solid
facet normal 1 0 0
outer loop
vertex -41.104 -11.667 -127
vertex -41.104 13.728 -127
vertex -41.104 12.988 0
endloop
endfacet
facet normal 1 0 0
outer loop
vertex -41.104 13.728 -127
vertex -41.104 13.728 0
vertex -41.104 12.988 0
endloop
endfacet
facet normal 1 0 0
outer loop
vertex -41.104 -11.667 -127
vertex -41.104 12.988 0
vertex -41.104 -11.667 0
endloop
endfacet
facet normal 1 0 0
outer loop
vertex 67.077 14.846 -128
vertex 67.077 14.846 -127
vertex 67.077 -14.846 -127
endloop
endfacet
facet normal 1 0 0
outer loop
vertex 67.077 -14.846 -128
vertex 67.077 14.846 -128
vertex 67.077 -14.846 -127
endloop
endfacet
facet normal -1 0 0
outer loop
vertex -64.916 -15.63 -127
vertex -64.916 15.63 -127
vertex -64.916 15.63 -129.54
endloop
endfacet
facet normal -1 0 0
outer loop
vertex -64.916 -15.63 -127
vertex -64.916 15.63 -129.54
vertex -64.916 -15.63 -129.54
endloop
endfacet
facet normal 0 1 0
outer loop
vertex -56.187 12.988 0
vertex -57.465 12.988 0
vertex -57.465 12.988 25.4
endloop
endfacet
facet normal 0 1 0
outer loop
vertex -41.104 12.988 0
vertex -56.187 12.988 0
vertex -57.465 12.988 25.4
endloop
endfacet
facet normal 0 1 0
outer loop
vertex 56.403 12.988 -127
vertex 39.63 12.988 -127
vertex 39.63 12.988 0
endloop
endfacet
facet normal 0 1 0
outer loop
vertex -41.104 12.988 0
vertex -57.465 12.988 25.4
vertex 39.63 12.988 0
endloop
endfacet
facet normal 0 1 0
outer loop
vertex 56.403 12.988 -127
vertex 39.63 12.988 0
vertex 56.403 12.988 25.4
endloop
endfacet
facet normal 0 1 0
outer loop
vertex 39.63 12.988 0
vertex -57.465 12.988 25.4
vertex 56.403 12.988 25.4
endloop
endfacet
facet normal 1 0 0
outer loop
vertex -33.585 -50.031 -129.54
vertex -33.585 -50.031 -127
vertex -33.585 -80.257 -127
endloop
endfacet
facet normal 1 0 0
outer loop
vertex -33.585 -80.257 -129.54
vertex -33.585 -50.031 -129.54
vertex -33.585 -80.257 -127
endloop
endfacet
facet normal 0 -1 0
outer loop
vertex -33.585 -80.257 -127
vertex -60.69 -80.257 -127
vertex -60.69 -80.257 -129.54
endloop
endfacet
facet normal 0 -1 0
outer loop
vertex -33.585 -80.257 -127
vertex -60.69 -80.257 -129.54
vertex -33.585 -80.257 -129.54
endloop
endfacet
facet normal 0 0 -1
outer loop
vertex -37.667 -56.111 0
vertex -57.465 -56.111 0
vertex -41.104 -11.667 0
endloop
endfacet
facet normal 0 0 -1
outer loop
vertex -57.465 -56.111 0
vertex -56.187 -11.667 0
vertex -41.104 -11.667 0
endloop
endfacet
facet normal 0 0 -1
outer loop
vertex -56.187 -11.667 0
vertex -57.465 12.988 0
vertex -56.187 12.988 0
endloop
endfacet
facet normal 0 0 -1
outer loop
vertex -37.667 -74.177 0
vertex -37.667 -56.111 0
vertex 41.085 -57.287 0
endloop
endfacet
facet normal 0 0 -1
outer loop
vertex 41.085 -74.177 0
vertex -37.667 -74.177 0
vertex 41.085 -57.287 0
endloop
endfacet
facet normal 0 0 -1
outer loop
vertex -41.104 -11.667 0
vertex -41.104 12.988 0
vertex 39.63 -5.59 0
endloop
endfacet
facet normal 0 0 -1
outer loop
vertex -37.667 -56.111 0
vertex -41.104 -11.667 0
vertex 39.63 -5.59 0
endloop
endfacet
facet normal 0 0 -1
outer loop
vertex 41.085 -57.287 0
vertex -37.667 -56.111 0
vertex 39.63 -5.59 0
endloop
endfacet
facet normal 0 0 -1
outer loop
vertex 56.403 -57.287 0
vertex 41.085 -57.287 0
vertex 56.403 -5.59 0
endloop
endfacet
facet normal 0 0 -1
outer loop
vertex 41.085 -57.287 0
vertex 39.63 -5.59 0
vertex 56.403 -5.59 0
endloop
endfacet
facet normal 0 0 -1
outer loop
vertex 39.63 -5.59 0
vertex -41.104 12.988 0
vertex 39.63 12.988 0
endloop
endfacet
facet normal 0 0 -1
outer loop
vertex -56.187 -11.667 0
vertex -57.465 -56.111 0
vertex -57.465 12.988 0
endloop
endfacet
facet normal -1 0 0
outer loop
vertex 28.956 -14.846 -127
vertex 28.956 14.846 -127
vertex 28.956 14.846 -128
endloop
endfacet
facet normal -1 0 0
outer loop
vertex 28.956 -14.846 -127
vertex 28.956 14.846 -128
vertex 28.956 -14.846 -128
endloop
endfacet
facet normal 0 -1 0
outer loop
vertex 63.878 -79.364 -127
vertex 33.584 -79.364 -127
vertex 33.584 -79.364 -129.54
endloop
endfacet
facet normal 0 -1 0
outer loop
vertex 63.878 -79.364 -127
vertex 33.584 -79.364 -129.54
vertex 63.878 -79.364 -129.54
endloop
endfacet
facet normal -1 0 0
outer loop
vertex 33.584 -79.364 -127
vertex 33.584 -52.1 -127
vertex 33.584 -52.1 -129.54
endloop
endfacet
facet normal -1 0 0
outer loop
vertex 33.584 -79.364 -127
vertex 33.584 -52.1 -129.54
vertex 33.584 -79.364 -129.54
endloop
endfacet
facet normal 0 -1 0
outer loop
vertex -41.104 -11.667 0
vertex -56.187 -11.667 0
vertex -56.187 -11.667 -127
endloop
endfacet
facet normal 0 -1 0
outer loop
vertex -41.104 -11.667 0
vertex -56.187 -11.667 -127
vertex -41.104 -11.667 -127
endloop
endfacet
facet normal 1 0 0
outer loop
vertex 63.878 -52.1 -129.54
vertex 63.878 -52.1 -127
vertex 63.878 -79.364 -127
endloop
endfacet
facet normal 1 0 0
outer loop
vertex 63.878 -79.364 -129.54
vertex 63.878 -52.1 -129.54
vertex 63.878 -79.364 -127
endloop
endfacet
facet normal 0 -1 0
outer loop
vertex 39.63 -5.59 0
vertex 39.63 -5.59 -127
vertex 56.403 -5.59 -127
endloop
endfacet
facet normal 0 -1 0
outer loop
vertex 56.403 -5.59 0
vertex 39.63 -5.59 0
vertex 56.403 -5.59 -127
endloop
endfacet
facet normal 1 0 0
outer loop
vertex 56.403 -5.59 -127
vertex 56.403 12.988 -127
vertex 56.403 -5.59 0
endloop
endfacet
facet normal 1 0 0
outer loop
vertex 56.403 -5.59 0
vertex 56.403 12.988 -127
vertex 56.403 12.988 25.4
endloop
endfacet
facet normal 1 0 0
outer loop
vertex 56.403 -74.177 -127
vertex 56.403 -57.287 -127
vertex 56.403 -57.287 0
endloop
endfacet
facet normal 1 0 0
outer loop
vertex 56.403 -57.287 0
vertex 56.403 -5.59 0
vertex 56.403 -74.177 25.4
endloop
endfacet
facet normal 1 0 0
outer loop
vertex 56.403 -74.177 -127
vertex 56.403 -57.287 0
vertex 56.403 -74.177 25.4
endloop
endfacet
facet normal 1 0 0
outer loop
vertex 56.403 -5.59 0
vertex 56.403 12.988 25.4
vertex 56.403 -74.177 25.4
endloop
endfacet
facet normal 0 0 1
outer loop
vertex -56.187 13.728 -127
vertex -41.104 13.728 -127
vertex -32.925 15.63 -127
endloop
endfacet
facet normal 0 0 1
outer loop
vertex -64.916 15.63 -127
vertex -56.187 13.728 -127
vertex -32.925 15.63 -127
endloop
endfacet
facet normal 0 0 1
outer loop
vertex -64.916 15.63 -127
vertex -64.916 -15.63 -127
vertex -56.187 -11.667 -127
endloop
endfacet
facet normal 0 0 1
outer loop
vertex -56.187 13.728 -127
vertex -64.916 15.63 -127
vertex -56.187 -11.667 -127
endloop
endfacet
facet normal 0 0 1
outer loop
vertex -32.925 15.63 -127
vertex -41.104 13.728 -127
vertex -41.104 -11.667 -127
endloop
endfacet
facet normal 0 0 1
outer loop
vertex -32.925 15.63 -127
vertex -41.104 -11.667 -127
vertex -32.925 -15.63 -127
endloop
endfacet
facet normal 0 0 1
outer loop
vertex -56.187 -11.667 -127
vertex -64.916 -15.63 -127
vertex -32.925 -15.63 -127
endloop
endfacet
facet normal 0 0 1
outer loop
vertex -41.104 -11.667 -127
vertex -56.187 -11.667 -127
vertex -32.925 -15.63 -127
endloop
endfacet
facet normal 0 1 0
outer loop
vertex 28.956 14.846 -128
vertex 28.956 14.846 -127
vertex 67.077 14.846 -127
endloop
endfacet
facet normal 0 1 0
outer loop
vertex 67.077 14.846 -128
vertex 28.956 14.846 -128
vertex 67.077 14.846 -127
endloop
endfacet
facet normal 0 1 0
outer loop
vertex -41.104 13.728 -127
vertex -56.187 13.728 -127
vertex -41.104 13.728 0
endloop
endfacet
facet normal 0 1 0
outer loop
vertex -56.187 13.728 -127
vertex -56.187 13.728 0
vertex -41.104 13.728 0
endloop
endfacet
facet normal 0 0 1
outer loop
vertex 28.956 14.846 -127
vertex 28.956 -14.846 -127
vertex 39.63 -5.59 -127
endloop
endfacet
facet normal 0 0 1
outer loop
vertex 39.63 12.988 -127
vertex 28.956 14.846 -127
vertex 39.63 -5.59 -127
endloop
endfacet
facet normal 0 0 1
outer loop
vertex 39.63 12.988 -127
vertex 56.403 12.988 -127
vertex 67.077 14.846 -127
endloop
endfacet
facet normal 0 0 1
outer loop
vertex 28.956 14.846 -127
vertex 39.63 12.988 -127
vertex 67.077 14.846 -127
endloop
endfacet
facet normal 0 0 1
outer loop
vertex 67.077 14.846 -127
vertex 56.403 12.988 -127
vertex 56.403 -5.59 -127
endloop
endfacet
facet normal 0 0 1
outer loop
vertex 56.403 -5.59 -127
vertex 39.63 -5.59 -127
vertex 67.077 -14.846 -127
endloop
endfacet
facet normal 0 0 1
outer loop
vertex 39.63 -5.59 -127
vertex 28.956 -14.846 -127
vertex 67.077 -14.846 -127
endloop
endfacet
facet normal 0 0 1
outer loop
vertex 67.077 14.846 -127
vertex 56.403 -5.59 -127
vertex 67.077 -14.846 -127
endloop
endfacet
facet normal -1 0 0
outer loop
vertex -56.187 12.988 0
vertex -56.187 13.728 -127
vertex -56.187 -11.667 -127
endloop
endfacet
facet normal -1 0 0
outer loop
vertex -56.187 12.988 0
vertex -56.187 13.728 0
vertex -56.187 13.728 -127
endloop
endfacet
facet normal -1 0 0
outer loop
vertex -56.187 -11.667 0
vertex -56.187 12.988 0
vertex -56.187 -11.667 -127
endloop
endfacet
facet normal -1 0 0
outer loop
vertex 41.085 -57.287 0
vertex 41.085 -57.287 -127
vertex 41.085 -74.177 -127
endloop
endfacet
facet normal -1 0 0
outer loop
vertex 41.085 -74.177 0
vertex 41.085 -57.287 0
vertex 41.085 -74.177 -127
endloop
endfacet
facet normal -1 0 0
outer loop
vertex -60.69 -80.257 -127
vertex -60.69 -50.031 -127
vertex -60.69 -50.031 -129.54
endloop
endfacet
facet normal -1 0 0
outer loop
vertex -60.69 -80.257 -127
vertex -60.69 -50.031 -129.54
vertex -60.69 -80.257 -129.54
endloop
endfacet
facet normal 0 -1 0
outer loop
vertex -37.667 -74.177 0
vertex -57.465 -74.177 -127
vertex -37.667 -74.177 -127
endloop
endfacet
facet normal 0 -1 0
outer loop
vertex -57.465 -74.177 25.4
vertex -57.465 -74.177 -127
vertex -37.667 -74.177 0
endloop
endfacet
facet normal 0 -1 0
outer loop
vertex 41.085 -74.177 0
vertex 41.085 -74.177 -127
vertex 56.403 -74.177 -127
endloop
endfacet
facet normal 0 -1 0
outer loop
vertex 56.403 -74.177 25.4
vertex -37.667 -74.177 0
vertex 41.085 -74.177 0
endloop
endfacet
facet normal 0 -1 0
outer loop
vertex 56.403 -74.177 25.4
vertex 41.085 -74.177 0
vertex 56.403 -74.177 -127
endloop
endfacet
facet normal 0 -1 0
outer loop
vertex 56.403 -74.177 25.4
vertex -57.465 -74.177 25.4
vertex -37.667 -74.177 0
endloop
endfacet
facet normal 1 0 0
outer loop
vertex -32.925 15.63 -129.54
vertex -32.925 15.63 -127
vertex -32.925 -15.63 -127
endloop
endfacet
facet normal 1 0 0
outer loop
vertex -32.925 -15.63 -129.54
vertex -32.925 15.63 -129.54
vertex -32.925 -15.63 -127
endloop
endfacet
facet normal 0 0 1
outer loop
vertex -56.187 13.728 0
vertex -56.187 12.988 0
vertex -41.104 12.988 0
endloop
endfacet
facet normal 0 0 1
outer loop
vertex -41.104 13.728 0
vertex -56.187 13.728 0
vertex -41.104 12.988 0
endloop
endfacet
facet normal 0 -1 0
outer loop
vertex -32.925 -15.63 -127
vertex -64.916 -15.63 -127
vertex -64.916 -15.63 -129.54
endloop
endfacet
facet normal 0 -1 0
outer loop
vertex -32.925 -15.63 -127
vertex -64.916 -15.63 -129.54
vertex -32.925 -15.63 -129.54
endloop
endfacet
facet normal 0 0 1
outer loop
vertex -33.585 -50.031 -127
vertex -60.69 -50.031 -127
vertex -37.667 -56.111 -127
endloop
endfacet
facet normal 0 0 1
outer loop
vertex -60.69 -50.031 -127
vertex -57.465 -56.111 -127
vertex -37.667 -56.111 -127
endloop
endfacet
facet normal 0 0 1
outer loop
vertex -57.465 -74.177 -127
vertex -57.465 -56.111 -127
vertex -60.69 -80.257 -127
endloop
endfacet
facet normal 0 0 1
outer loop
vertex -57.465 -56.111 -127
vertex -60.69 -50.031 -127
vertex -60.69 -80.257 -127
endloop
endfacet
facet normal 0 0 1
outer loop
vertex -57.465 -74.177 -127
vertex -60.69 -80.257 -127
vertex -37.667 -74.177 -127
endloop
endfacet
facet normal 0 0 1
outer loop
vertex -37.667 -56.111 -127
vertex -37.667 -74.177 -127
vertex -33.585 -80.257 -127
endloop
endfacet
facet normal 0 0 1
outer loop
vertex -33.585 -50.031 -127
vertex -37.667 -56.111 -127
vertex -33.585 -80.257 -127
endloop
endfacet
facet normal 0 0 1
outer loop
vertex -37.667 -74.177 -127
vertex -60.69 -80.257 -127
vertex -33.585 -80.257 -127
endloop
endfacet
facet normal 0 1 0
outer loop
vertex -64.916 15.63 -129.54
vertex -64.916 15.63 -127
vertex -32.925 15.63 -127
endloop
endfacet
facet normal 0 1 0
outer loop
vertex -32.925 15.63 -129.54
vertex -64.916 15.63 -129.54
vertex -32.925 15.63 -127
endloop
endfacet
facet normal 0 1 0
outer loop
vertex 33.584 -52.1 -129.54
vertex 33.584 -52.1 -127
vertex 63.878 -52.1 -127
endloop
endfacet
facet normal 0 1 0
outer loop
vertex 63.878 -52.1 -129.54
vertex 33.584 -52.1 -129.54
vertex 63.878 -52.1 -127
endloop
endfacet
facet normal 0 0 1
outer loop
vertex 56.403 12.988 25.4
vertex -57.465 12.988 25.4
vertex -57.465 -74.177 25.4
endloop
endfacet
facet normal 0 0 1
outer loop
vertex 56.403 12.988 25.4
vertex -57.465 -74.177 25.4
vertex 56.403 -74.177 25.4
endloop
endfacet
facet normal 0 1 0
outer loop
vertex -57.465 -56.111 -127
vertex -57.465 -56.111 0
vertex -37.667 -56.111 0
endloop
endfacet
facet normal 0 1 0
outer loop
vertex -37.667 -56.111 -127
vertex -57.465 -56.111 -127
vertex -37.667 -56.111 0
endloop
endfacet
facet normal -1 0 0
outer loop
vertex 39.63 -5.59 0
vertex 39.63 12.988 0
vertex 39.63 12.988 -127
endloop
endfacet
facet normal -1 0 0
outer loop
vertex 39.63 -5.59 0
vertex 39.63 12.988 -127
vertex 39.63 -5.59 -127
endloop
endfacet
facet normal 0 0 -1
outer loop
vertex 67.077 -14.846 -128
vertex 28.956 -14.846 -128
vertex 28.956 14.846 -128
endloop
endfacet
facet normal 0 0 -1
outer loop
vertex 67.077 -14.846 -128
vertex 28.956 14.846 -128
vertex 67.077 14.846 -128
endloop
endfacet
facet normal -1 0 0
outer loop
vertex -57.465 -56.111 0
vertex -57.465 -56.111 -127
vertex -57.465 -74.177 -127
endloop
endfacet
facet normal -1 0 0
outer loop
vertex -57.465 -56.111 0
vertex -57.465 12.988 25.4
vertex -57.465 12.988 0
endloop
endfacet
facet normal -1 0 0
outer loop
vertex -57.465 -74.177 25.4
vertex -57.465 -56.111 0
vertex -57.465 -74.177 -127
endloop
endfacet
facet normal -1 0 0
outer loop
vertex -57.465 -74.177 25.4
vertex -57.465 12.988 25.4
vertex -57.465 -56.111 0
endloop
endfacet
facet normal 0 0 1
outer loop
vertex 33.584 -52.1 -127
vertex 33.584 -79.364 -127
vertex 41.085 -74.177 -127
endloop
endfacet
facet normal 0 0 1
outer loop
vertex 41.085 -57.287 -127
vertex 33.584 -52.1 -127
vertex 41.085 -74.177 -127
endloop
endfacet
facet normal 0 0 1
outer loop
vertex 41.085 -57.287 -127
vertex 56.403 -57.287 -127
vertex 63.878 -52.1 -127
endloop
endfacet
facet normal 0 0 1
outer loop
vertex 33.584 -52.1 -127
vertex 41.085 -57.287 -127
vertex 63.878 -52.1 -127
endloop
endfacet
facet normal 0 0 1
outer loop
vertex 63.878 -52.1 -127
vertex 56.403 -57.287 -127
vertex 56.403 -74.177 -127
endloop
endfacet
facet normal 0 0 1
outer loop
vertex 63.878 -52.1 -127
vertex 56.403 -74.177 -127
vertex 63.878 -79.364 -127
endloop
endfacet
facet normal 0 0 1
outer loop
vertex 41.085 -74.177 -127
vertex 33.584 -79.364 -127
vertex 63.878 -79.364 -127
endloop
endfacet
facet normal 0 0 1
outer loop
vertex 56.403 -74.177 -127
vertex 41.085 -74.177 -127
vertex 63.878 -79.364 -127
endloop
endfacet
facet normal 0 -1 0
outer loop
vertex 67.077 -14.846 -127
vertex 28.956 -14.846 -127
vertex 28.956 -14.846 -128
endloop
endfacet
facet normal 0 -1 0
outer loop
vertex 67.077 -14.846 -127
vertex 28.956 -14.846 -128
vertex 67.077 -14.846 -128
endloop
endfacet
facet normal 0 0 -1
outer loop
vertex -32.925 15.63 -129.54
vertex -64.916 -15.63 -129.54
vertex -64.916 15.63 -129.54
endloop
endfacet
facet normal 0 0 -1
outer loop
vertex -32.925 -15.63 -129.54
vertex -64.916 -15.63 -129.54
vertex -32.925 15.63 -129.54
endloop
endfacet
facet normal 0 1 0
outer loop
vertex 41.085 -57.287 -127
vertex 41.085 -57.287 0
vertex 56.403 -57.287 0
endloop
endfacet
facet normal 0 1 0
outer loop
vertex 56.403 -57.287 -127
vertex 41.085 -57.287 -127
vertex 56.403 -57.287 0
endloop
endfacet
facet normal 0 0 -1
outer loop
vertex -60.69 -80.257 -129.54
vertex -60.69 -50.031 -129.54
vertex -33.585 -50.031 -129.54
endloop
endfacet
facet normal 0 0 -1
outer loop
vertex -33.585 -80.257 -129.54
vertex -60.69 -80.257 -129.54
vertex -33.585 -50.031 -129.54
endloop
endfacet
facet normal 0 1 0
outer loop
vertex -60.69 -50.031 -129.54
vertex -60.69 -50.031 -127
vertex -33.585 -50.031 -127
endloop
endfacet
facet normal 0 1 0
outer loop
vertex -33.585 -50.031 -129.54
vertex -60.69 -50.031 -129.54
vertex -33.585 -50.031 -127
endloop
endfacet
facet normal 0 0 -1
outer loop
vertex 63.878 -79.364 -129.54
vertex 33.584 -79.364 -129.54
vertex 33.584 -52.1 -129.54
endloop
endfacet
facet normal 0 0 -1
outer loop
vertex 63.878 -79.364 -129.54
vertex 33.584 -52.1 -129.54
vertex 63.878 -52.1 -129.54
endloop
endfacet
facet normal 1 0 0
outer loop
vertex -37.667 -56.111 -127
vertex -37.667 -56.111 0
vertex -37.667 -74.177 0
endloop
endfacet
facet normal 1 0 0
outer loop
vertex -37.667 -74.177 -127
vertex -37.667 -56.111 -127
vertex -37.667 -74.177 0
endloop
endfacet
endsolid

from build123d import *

# Parameters (mm, degrees)
F0_W      = 113.8684004545
F0_H      = 36.3644612953
F1_DEPTH  = 25.4
F2_DEPTH  = 50.8
F3_W      = 15.3176933527
F3_H      = 16.8904128104
F4_DEPTH  = 127
F5_W      = 19.7984315455
F5_H      = 18.0663006932
F6_DEPTH  = 127
F7_W      = 16.7733989656
F7_H      = 18.577855546
F9_DEPTH  = 127
F10_W     = 15.0831528008
F10_H     = 25.3941109404
F11_DEPTH = 25.4
F12_W     = 15.0831528008
F12_H     = 25.3941109404
F13_DEPTH = 101.6
F14_W     = 31.9914445281
F14_H     = 31.2603749335
F15_DEPTH = 2.54
F16_W     = 27.1054208279
F16_H     = 30.2256134719
F17_DEPTH = 2.54
F18_W     = 38.1215699017
F18_H     = 29.6914111823
F19_DEPTH = 1
F20_W     = 30.2939862013
F20_H     = 27.2640747398
F21_DEPTH = 2.54


with BuildPart() as f1:
    # F0 (on Top) → F1 (new body)
    with BuildSketch(Plane.XY):
        with Locations((-0.5311109126, -5.1947091706)):
            Rectangle(F0_W, F0_H)
    extrude(amount=F1_DEPTH)

    # F2 (add): a face of the model
    f2_faces = [f1.faces().sort_by_distance(p)[0] for p in [
        (-0.5311109126, -23.3769398183, 12.7),
    ]]
    extrude(f2_faces, amount=F2_DEPTH)

    # F3 (on face) → F4 (join)
    with BuildSketch(Plane(origin=(0, 0, 0), x_dir=(1, 0, 0), z_dir=(0, 0, -1))):
        with Locations((48.7442426383, 65.731733413)):
            Rectangle(F3_W, F3_H)
    extrude(amount=F4_DEPTH)

    # F5 (on face) → F6 (join)
    with BuildSketch(Plane(origin=(0, 0, 0), x_dir=(1, 0, 0), z_dir=(0, 0, -1))):
        with Locations((-47.5660953671, 65.1437894717)):
            Rectangle(F5_W, F5_H)
    extrude(amount=F6_DEPTH)

    # F7 (on face) → F9 (join)
    with BuildSketch(Plane(origin=(0, 0, 0), x_dir=(1, 0, 0), z_dir=(0, 0, -1))):
        with Locations((48.0163898319, -3.698593704)):
            Rectangle(F7_W, F7_H)
    extrude(amount=F9_DEPTH)

    # F10 (on face) → F11 (join)
    with BuildSketch(Plane(origin=(0, 0, 0), x_dir=(1, 0, 0), z_dir=(0, 0, -1))):
        with Locations((-48.6456360668, -1.0305386968)):
            Rectangle(F10_W, F10_H)
    extrude(amount=F11_DEPTH)

    # F12 (on face) → F13 (join)
    with BuildSketch(Plane(origin=(0, 0, -25.4), x_dir=(1, 0, 0), z_dir=(0, 0, -1))):
        with Locations((-48.6456360668, -1.0305386968)):
            Rectangle(F12_W, F12_H)
    extrude(amount=F13_DEPTH)

    # F14 (on face) → F15 (join)
    with BuildSketch(Plane(origin=(0, 0, -127), x_dir=(1, 0, 0), z_dir=(0, 0, -1))):
        with Locations((-48.9207692444, 0)):
            Rectangle(F14_W, F14_H)
    extrude(amount=F15_DEPTH)

    # F16 (on face) → F17 (join)
    with BuildSketch(Plane(origin=(0, 0, -127), x_dir=(1, 0, 0), z_dir=(0, 0, -1))):
        with Locations((-47.1377819777, 65.1437894717)):
            Rectangle(F16_W, F16_H)
    extrude(amount=F17_DEPTH)

    # F18 (on face) → F19 (join)
    with BuildSketch(Plane(origin=(0, 0, -127), x_dir=(1, 0, 0), z_dir=(0, 0, -1))):
        with Locations((48.0163898319, 0)):
            Rectangle(F18_W, F18_H)
    extrude(amount=F19_DEPTH)

    # F20 (on face) → F21 (join)
    with BuildSketch(Plane(origin=(0, 0, -127), x_dir=(1, 0, 0), z_dir=(0, 0, -1))):
        with Locations((48.7307161093, 65.731733413)):
            Rectangle(F20_W, F20_H)
    extrude(amount=F21_DEPTH)


solid = f1.part
